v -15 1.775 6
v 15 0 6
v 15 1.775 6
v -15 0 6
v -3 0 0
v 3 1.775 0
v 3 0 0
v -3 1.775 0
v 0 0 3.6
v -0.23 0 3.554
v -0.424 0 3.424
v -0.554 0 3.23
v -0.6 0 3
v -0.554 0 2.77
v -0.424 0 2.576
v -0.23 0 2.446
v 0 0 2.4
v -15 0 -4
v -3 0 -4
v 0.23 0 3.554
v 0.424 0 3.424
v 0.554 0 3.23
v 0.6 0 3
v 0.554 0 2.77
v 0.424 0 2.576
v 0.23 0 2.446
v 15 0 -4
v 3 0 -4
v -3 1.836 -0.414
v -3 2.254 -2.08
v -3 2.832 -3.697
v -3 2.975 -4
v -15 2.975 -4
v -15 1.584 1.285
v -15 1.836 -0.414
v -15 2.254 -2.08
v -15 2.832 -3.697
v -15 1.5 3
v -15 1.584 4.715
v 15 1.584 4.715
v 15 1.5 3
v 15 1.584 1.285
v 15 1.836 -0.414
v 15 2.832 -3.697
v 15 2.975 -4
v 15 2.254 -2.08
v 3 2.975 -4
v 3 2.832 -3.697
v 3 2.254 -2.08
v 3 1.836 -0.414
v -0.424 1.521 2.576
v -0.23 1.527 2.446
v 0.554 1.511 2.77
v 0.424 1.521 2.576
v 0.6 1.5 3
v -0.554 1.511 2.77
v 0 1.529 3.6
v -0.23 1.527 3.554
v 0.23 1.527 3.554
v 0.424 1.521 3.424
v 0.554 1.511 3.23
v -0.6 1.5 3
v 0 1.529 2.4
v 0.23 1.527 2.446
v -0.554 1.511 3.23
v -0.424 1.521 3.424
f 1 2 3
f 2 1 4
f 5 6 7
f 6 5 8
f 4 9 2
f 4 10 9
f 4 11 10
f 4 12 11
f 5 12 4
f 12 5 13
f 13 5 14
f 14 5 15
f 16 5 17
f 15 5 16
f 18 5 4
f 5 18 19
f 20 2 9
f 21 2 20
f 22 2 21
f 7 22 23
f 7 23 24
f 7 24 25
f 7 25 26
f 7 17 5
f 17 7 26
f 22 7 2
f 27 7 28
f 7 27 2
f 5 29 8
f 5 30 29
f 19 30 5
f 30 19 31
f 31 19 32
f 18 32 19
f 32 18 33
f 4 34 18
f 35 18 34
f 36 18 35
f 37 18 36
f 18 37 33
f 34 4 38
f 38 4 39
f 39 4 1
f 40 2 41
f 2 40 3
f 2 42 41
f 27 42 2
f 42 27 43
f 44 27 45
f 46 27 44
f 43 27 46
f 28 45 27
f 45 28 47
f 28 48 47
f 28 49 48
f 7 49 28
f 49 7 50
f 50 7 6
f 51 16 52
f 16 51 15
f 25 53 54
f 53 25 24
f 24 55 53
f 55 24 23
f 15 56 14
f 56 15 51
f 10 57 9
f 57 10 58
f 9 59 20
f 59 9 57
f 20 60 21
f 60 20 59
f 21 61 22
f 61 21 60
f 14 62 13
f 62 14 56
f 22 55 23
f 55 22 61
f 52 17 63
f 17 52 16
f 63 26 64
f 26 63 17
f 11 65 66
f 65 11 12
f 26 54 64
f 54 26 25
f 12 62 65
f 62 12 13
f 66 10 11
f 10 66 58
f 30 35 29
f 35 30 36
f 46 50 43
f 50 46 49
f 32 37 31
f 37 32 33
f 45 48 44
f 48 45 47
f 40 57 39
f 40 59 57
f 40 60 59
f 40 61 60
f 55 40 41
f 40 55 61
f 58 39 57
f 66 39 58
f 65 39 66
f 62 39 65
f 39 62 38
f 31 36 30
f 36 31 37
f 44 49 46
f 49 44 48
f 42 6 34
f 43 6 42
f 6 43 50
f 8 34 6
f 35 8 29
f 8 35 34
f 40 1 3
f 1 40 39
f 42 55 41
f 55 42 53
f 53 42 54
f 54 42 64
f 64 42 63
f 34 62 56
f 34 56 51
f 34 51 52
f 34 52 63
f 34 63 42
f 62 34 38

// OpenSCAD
// BreathSense Nasal Clip - Parametric Design
// For 2mm thermistor bead + XIAO nRF52840

// === PARAMETERS (adjust to fit) ===
thermistor_dia = 2.0;       // Thermistor bead diameter
wire_dia = 0.5;             // Wire channel diameter (30 AWG + enamel)
wire_channel_dia = 1.2;     // Slightly larger for easy routing

nose_bridge_width = 28;     // Width across nose bridge
nose_bridge_height = 6;     // Height of bridge piece
nose_bridge_depth = 4;      // Thickness

pad_width = 12;             // Width of each nose pad
pad_height = 10;            // Height of pad
pad_depth = 3;              // Thickness of pad
pad_spacing = 18;           // Distance between pads (center to center)

sensor_arm_length = 15;     // Length of arm holding thermistor
sensor_arm_width = 4;       // Width of sensor arm
sensor_pocket_dia = 2.8;    // Pocket for thermistor (slightly larger than bead)

wall = 1.5;                 // General wall thickness

// === MAIN CLIP ===
module nasal_clip() {
    difference() {
        union() {
            // Nose bridge
            translate([-nose_bridge_width/2, 0, 0])
                cube([nose_bridge_width, nose_bridge_depth, nose_bridge_height]);
            
            // Left pad
            translate([-pad_spacing/2 - pad_width/2, 0, -pad_height + nose_bridge_height])
                cube([pad_width, pad_depth, pad_height]);
            
            // Right pad
            translate([pad_spacing/2 - pad_width/2, 0, -pad_height + nose_bridge_height])
                cube([pad_width, pad_depth, pad_height]);
            
            // Sensor arm (center, going down and forward)
            translate([-sensor_arm_width/2, 0, 0])
                cube([sensor_arm_width, sensor_arm_length, nose_bridge_height/2]);
            
            // Thermistor holder at end of arm
            translate([0, sensor_arm_length, nose_bridge_height/4])
                sphere(d = sensor_pocket_dia + wall*2, $fn=32);
        }
        
        // Wire channel through bridge and down arm
        translate([0, -1, nose_bridge_height/2])
            rotate([-90, 0, 0])
                cylinder(d = wire_channel_dia, h = sensor_arm_length + 5, $fn=16);
        
        // Thermistor pocket (open at bottom for airflow)
        translate([0, sensor_arm_length, nose_bridge_height/4])
            sphere(d = sensor_pocket_dia, $fn=32);
        
        // Opening for thermistor insertion (from below)
        translate([0, sensor_arm_length, -5])
            cylinder(d = sensor_pocket_dia, h = nose_bridge_height/4 + 5, $fn=16);
        
        // Comfort curve on bridge (slight arch)
        translate([0, nose_bridge_depth + 15, nose_bridge_height/2])
            rotate([0, 90, 0])
                cylinder(d = 35, h = nose_bridge_width + 10, center=true, $fn=64);
    }
}

// === SOFT PAD (print in TPU) ===
module soft_pad() {
    difference() {
        // Outer pad shape
        hull() {
            translate([0, 0, 0])
                cube([pad_width + 2, pad_depth + 2, 0.1]);
            translate([1, 1, pad_height])
                cube([pad_width, pad_depth, 0.1]);
        }
        
        // Cutout for rigid pad to slot in
        translate([1, 0, 2])
            cube([pad_width, pad_depth, pad_height]);
    }
}

// === RENDER ===
// Uncomment the part you want to export:

nasal_clip();           // Main clip body (print in PLA/PETG)

// Soft pads - print separately in TPU
// translate([40, 0, 0]) soft_pad();
// translate([60, 0, 0]) soft_pad();
